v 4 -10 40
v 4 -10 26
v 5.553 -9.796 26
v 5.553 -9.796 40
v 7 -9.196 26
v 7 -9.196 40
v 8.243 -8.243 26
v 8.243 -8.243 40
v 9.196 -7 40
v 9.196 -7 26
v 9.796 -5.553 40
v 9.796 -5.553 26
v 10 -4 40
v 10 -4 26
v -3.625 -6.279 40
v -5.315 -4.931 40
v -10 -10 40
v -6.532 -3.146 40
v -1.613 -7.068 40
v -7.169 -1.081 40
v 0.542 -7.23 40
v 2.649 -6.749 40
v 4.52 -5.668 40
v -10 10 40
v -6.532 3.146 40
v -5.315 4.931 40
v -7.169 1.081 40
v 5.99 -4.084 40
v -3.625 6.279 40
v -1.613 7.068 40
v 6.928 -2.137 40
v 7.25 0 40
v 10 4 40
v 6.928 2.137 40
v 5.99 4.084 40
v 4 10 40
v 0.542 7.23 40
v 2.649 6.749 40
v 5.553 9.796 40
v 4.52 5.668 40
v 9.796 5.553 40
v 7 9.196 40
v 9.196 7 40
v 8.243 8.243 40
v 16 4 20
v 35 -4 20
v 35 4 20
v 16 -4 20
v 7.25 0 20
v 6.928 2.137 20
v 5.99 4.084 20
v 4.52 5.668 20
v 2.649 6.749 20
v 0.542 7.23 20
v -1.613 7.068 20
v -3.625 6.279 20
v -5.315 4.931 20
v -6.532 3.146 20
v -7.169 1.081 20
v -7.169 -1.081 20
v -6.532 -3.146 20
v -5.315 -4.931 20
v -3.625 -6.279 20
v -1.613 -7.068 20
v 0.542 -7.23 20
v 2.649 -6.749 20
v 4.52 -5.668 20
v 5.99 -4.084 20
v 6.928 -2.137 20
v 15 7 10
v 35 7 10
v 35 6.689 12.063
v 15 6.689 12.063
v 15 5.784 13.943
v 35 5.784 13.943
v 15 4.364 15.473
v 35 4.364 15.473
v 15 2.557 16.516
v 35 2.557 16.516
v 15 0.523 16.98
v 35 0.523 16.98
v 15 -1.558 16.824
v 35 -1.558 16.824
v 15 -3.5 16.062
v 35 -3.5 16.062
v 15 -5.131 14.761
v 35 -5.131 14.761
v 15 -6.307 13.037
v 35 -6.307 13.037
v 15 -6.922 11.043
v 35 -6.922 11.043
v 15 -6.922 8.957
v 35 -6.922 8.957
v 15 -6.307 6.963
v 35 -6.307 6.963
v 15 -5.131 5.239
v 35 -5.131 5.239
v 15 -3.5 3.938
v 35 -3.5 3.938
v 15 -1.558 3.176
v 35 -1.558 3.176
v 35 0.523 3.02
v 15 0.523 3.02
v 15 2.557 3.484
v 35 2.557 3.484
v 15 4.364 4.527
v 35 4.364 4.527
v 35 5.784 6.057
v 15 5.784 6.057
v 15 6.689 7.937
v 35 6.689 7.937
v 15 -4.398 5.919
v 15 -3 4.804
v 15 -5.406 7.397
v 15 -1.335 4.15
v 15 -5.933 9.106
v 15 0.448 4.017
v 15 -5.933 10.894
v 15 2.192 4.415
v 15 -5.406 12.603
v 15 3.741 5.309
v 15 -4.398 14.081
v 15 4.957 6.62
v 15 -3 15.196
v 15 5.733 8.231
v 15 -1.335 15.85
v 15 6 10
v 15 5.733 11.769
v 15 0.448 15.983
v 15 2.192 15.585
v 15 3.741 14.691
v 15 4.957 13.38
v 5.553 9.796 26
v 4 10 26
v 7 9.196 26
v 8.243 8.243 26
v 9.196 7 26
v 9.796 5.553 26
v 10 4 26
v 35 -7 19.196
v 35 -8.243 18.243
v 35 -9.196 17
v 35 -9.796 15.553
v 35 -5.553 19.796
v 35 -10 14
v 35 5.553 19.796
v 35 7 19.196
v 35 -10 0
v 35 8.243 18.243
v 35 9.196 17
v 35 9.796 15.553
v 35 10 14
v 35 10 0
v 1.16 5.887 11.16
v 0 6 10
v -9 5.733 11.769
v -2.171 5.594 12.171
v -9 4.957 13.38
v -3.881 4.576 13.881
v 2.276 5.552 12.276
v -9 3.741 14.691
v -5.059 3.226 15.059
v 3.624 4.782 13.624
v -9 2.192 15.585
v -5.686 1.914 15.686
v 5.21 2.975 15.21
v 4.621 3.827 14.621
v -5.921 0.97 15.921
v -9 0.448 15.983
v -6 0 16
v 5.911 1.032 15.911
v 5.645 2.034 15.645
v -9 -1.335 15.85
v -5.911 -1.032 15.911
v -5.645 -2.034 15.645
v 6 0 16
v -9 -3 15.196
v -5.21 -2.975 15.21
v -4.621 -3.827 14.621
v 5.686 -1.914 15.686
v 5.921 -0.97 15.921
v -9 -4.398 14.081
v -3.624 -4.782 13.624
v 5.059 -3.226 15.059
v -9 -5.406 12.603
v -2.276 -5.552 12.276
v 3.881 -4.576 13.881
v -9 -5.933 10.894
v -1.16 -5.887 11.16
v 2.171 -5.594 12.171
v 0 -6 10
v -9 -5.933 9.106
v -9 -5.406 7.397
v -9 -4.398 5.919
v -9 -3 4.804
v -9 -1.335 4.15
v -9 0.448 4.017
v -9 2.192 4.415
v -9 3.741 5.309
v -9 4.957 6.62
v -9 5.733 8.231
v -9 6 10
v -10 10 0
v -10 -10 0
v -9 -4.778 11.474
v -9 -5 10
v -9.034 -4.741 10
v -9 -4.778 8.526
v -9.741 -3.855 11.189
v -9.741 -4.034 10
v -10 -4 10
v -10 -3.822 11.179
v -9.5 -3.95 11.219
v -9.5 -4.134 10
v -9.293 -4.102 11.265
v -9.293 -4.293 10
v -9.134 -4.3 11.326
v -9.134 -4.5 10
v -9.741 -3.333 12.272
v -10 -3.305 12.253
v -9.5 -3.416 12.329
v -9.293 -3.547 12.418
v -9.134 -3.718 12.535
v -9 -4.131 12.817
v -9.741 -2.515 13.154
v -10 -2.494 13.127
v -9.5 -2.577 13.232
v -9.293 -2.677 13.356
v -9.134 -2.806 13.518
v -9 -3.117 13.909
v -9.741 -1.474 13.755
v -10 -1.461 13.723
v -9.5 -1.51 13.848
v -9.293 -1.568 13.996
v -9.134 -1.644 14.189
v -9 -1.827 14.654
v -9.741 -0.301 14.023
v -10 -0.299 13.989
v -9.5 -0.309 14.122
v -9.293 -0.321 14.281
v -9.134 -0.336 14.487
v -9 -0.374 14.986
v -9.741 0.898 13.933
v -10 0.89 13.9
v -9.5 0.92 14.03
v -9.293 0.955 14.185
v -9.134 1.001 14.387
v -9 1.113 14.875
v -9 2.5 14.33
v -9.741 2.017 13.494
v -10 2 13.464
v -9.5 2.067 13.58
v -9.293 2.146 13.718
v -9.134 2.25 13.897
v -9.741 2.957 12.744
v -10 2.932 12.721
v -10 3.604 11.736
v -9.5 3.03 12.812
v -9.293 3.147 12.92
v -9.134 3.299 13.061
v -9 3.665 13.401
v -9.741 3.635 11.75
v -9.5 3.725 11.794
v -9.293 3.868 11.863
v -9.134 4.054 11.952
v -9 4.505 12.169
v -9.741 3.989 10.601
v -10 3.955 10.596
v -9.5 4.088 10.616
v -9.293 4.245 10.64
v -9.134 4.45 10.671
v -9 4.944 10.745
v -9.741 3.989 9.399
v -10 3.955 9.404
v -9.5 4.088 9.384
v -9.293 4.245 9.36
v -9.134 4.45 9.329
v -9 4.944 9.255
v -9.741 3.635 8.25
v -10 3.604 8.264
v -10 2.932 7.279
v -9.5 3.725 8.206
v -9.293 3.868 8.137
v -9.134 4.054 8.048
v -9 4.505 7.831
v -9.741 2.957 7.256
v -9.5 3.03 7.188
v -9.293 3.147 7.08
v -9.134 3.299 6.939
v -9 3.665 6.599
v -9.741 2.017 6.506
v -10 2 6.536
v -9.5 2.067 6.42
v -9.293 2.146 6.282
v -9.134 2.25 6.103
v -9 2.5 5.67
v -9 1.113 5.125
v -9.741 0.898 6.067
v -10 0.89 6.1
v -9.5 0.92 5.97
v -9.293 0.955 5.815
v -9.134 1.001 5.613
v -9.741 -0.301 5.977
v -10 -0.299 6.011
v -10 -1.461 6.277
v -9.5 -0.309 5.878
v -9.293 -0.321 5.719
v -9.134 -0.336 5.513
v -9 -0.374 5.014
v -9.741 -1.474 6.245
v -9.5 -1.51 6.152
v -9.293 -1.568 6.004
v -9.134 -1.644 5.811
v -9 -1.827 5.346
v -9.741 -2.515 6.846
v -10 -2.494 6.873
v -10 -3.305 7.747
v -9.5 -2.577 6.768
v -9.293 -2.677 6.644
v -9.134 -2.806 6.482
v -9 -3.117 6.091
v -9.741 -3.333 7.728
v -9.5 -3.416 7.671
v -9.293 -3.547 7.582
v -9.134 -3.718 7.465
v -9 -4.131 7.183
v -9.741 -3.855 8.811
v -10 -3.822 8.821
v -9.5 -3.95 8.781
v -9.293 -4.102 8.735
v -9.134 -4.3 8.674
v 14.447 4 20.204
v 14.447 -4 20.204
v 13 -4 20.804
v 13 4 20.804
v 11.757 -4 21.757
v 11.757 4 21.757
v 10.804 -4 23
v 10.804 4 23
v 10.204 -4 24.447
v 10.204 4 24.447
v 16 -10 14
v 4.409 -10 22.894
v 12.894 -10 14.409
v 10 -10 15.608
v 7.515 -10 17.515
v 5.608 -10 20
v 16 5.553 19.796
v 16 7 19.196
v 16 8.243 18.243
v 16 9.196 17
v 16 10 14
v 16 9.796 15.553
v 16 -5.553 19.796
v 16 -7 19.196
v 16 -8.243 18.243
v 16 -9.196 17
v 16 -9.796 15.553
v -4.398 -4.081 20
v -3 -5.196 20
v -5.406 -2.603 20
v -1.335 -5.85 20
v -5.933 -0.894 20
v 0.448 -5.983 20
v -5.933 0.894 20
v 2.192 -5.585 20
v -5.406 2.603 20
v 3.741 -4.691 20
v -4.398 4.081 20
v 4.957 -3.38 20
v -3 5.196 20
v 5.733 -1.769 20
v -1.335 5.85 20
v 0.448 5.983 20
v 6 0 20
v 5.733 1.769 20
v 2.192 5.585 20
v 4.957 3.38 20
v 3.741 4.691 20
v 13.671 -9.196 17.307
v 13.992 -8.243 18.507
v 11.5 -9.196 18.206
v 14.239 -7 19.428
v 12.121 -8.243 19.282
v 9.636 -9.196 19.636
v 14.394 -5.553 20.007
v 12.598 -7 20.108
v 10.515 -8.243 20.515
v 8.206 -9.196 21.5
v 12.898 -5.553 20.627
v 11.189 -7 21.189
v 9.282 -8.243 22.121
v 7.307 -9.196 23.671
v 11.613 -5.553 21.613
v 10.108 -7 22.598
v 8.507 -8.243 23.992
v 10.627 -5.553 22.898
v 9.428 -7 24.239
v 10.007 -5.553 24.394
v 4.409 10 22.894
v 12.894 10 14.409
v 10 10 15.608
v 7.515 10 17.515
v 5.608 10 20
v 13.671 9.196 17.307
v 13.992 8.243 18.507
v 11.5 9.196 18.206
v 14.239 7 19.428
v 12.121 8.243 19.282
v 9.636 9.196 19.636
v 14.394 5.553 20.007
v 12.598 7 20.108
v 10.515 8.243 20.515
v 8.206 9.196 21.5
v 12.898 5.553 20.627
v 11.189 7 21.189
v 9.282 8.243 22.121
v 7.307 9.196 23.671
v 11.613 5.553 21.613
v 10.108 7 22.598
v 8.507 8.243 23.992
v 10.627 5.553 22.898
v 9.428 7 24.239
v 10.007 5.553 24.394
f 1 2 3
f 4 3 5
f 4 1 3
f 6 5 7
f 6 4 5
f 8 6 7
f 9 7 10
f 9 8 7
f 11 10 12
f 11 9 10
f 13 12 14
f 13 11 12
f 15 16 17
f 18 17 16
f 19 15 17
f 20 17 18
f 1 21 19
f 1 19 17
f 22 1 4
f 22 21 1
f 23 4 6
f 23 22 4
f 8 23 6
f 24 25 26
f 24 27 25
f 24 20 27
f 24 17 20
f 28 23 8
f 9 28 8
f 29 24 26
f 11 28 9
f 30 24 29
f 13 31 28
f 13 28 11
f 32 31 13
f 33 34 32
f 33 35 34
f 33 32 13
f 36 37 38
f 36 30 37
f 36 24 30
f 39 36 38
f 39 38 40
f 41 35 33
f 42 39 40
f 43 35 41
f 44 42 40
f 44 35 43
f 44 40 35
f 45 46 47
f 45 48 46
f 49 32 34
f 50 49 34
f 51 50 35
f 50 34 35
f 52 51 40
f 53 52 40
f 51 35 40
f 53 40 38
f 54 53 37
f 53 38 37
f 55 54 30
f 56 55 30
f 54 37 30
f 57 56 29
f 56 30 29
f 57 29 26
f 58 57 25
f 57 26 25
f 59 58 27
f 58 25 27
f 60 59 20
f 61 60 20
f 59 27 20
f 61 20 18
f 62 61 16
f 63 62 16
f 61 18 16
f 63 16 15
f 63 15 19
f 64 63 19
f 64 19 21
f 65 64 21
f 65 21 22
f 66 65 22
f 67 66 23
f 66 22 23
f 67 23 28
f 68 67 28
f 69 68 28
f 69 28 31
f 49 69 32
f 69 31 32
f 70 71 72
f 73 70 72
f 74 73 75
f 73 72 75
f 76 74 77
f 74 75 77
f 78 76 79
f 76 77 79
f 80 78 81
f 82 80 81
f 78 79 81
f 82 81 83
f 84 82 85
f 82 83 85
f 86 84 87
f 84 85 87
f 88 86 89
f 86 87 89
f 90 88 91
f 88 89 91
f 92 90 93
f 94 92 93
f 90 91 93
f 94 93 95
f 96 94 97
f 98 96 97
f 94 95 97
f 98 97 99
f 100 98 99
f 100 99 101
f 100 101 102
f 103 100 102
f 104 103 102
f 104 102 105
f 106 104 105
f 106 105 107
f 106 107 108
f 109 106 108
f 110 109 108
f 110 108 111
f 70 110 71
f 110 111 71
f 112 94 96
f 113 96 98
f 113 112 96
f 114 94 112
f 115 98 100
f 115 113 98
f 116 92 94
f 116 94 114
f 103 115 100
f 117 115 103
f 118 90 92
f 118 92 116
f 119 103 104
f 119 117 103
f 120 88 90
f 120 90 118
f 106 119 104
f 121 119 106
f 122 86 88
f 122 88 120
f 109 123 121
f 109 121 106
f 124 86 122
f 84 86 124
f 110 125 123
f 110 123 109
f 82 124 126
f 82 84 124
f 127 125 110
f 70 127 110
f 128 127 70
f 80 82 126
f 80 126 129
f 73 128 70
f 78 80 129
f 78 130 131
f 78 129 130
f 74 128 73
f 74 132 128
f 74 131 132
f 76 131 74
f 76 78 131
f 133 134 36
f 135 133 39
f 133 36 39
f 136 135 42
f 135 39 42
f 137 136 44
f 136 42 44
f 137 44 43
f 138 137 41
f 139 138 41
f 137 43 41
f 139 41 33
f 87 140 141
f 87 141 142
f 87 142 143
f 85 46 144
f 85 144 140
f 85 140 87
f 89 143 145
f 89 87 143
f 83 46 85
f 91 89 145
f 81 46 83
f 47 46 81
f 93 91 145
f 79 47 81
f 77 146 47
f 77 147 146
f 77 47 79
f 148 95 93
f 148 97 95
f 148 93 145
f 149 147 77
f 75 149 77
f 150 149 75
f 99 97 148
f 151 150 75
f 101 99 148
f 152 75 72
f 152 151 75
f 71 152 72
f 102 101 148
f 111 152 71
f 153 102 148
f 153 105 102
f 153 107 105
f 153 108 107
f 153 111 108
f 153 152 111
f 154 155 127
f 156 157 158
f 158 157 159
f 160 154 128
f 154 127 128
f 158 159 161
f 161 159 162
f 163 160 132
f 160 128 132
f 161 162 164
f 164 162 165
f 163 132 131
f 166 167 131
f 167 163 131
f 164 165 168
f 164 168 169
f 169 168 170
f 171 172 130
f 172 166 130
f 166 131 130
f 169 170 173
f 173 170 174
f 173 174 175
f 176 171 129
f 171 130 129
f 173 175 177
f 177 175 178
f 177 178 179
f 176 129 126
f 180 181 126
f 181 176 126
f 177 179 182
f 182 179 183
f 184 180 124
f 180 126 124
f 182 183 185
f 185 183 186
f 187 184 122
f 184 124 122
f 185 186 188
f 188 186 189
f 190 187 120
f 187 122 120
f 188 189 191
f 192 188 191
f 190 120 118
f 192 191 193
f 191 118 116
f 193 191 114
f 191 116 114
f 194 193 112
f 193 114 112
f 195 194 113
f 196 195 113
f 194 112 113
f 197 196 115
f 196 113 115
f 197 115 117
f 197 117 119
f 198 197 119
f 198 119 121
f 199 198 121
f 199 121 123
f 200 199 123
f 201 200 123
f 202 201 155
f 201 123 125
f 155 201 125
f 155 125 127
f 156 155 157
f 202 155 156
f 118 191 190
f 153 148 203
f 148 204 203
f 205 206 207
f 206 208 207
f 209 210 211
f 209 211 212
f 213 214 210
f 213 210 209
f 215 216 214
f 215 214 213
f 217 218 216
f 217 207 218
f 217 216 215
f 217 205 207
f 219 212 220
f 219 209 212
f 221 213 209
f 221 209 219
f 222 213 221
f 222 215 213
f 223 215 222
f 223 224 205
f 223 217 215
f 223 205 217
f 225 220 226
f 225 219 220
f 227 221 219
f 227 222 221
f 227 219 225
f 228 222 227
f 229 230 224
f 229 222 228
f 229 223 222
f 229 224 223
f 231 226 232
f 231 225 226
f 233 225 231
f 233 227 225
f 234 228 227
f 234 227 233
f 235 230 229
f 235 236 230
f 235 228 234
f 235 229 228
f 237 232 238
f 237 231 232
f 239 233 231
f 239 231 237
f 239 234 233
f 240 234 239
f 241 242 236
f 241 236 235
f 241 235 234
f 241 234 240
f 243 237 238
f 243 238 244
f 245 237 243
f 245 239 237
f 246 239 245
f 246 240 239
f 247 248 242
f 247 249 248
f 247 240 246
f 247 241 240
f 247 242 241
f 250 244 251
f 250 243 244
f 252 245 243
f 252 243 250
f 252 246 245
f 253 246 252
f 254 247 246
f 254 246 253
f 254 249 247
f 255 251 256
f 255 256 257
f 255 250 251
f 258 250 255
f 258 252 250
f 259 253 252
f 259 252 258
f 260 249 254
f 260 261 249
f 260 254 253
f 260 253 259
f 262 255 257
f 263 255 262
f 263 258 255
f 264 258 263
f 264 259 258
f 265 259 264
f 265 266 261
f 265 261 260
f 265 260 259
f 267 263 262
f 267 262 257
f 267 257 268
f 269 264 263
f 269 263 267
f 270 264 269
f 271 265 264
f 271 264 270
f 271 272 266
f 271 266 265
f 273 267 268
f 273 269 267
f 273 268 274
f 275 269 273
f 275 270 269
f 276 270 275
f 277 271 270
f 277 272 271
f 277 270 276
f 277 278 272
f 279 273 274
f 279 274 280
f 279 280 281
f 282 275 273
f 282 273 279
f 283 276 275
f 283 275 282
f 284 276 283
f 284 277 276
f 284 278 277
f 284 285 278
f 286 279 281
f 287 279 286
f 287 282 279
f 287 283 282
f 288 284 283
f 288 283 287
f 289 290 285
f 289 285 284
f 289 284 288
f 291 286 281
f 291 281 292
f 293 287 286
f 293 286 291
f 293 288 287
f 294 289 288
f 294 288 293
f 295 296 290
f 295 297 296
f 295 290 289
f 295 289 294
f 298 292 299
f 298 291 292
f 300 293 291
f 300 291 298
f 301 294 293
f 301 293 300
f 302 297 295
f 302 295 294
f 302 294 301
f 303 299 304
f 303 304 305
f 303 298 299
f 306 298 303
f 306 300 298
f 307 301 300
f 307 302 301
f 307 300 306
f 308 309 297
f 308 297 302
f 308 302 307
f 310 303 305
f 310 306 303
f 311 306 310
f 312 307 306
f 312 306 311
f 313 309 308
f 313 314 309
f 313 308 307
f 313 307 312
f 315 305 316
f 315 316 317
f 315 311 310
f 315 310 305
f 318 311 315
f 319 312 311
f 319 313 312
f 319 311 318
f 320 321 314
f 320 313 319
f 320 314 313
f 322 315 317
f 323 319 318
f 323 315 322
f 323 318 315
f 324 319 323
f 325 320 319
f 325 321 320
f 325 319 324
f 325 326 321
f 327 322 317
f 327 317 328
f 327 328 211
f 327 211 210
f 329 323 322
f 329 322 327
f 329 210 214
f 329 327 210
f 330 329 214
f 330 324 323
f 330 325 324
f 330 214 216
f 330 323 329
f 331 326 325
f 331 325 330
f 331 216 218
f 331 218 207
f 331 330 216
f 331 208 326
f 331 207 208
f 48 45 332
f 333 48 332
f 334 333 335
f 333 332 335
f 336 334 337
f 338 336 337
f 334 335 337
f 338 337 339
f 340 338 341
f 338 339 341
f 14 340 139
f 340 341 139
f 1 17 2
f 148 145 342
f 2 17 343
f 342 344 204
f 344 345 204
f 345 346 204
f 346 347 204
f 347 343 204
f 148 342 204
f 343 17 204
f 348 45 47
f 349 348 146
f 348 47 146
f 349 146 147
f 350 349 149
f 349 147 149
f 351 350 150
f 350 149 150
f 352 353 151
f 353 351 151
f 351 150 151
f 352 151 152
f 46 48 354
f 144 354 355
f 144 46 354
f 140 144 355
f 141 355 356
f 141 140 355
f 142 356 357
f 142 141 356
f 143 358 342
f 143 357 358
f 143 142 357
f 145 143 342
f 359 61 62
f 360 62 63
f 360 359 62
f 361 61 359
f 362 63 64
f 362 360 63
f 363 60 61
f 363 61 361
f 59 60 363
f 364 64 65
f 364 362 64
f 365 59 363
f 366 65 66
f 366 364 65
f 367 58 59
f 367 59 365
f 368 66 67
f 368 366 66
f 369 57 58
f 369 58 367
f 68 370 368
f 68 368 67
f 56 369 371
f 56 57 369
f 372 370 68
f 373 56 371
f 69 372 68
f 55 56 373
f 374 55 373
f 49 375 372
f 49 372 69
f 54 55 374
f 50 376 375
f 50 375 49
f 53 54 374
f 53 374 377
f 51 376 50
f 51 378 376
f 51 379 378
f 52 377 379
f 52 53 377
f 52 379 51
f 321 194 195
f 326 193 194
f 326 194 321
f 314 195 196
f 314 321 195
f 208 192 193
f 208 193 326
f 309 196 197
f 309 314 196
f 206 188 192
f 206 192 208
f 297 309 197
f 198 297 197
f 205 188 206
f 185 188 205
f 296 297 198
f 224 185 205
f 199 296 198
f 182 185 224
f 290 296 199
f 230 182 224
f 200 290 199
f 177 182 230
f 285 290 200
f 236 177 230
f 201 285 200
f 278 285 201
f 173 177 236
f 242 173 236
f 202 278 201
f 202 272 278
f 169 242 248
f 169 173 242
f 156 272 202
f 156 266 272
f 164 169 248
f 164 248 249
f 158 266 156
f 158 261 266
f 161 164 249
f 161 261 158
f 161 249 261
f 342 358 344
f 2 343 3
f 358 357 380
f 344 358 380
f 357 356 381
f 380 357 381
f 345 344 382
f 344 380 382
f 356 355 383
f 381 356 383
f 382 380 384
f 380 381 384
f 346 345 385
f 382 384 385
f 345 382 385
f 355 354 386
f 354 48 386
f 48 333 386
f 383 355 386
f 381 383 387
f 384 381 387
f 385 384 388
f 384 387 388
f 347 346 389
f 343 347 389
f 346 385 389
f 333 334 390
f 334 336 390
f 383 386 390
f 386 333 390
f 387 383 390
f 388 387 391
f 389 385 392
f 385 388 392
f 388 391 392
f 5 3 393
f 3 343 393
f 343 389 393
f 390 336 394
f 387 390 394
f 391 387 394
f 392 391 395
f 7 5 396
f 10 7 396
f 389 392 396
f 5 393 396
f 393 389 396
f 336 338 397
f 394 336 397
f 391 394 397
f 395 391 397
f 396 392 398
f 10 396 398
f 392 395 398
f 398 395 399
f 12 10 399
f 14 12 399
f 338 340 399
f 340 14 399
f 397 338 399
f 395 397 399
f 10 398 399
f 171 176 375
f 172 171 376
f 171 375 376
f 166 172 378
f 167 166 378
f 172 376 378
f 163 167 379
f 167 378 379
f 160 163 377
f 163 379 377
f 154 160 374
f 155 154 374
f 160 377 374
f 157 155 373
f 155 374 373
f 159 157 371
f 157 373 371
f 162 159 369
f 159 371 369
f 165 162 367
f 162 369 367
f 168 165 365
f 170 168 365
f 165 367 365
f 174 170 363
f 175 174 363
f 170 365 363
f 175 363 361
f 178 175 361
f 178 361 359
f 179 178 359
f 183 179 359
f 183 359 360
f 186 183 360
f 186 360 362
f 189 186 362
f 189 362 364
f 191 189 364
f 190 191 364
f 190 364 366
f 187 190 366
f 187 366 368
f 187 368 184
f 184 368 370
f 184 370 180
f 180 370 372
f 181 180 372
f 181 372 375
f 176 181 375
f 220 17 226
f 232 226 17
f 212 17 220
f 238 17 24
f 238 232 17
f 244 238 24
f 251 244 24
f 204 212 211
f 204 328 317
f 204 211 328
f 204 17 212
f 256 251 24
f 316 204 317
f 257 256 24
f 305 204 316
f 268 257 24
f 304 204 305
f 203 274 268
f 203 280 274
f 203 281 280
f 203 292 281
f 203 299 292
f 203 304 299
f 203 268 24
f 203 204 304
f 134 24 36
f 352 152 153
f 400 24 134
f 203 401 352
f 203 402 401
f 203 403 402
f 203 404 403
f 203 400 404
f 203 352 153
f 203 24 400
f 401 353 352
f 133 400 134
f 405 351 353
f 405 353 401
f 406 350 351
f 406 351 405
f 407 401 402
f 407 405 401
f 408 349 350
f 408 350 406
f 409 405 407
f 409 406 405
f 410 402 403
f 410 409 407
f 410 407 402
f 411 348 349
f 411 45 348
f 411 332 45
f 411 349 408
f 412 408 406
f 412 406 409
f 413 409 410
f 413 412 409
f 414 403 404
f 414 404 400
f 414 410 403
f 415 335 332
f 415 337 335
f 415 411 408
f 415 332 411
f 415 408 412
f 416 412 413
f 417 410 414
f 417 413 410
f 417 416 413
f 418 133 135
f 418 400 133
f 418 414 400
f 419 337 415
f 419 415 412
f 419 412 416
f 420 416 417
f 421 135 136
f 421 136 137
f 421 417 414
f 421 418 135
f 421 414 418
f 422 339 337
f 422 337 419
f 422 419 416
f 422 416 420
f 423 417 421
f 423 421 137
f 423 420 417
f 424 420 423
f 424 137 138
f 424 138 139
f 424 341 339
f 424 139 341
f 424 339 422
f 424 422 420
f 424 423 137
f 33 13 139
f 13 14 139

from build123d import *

# Parameters (mm, degrees)
SKETCH_2_W                 = 20
SKETCH_2_H                 = 20
EXTRUDE_482_DEPTH          = 40
SKETCH_4_W                 = 20
SKETCH_4_H                 = 20
EXTRUDE_639_DEPTH          = 25
SKETCH_7_R                 = 6
CUT_EXTRUDE_822_DEPTH      = 44
CUT_EXTRUDE_968_REACH      = 56.083
CUT_EXTRUDE_968_END_RADIUS = 6
SKETCH_8_R                 = 6
SKETCH_9_R                 = 7.25
CUT_EXTRUDE_1104_DEPTH     = 20
SKETCH_10_R                = 7
CUT_EXTRUDE_1247_DEPTH     = 20
CUT_EXTRUDE_1380_REACH     = 63.033
SKETCH_11_R                = 4
FILLET_2_R                 = 6
FILLET_5_R                 = 1


with BuildPart() as part:
    # Эскиз2 → Extrude 482 (new body)
    with BuildSketch(Plane.XY):
        Rectangle(SKETCH_2_W, SKETCH_2_H)
    extrude(amount=EXTRUDE_482_DEPTH)

    # Эскиз4 → Extrude 639 (add)
    with BuildSketch(Plane(origin=(10, 0, 0), x_dir=(0, 0, -1), z_dir=(1, 0, 0))):
        with Locations((-10, 0)):
            Rectangle(SKETCH_4_W, SKETCH_4_H)
    extrude(amount=EXTRUDE_639_DEPTH)

    # Эскиз7 → Cut-Extrude 822 (cut)
    with BuildSketch(Plane(origin=(35, 0, 0), x_dir=(0, 0, -1), z_dir=(1, 0, 0))):
        with Locations(Location((-10, 0, 0), (0, 0, 90))):
            Circle(SKETCH_7_R)
    extrude(amount=-CUT_EXTRUDE_822_DEPTH, mode=Mode.SUBTRACT)

    # Cut-Extrude 968: up to this cylinder (the profile starts outside it)
    cut_extrude_968_end = Plane(origin=(0, 0, 10), z_dir=(1, 0, 0)) * Cylinder(CUT_EXTRUDE_968_END_RADIUS, 125.166, mode=Mode.PRIVATE)
    # Эскиз8 → Cut-Extrude 968 (cut, up to the surface)
    with BuildSketch(Plane.XY.offset(40), mode=Mode.PRIVATE) as cut_extrude_968_sk1:
        Circle(SKETCH_8_R)
    cut_extrude_968_tool1 = extrude(cut_extrude_968_sk1.sketch, amount=-CUT_EXTRUDE_968_REACH, mode=Mode.PRIVATE) - cut_extrude_968_end
    add(cut_extrude_968_tool1.solids().sort_by_distance((0, 0, 40))[0], mode=Mode.SUBTRACT)

    # Эскиз9 → Cut-Extrude 1104 (cut)
    with BuildSketch(Plane.XY.offset(40)):
        Circle(SKETCH_9_R)
    extrude(amount=-CUT_EXTRUDE_1104_DEPTH, mode=Mode.SUBTRACT)

    # Эскиз10 → Cut-Extrude 1247 (cut)
    with BuildSketch(Plane(origin=(35, 0, 0), x_dir=(0, 0, -1), z_dir=(1, 0, 0))):
        with Locations(Location((-10, 0, 0), (0, 0, 90))):
            Circle(SKETCH_10_R)
    extrude(amount=-CUT_EXTRUDE_1247_DEPTH, mode=Mode.SUBTRACT)

    # Эскиз11 → Cut-Extrude 1380 (cut, up to next)
    with BuildSketch(Plane.ZY.offset(10), mode=Mode.PRIVATE) as cut_extrude_1380_sk1:
        with Locations(Location((10, 0, 0), (0, 0, 270))):
            Circle(SKETCH_11_R)
    cut_extrude_1380_tool1 = extrude(cut_extrude_1380_sk1.sketch, amount=-CUT_EXTRUDE_1380_REACH, mode=Mode.PRIVATE) & part.part
    add(cut_extrude_1380_tool1.solids().sort_by_distance((-10, 0, 10))[0], mode=Mode.SUBTRACT)

    # Скругление2
    fillet_2_edges = [part.edges().sort_by_distance(p)[0] for p in [
        (10, 0, 20),
        (22.5, 10, 20),
        (22.5, -10, 20),
        (10, -10, 30),
        (10, 10, 30),
    ]]
    fillet(fillet_2_edges, radius=FILLET_2_R)

    # Скругление5
    fillet_5_edges = [part.edges().sort_by_distance(p)[0] for p in [
        (-9, 4, 10),
    ]]
    fillet(fillet_5_edges, radius=FILLET_5_R - 0.0001)  # a hair under: the kernel refuses the full size


solid = part.part
